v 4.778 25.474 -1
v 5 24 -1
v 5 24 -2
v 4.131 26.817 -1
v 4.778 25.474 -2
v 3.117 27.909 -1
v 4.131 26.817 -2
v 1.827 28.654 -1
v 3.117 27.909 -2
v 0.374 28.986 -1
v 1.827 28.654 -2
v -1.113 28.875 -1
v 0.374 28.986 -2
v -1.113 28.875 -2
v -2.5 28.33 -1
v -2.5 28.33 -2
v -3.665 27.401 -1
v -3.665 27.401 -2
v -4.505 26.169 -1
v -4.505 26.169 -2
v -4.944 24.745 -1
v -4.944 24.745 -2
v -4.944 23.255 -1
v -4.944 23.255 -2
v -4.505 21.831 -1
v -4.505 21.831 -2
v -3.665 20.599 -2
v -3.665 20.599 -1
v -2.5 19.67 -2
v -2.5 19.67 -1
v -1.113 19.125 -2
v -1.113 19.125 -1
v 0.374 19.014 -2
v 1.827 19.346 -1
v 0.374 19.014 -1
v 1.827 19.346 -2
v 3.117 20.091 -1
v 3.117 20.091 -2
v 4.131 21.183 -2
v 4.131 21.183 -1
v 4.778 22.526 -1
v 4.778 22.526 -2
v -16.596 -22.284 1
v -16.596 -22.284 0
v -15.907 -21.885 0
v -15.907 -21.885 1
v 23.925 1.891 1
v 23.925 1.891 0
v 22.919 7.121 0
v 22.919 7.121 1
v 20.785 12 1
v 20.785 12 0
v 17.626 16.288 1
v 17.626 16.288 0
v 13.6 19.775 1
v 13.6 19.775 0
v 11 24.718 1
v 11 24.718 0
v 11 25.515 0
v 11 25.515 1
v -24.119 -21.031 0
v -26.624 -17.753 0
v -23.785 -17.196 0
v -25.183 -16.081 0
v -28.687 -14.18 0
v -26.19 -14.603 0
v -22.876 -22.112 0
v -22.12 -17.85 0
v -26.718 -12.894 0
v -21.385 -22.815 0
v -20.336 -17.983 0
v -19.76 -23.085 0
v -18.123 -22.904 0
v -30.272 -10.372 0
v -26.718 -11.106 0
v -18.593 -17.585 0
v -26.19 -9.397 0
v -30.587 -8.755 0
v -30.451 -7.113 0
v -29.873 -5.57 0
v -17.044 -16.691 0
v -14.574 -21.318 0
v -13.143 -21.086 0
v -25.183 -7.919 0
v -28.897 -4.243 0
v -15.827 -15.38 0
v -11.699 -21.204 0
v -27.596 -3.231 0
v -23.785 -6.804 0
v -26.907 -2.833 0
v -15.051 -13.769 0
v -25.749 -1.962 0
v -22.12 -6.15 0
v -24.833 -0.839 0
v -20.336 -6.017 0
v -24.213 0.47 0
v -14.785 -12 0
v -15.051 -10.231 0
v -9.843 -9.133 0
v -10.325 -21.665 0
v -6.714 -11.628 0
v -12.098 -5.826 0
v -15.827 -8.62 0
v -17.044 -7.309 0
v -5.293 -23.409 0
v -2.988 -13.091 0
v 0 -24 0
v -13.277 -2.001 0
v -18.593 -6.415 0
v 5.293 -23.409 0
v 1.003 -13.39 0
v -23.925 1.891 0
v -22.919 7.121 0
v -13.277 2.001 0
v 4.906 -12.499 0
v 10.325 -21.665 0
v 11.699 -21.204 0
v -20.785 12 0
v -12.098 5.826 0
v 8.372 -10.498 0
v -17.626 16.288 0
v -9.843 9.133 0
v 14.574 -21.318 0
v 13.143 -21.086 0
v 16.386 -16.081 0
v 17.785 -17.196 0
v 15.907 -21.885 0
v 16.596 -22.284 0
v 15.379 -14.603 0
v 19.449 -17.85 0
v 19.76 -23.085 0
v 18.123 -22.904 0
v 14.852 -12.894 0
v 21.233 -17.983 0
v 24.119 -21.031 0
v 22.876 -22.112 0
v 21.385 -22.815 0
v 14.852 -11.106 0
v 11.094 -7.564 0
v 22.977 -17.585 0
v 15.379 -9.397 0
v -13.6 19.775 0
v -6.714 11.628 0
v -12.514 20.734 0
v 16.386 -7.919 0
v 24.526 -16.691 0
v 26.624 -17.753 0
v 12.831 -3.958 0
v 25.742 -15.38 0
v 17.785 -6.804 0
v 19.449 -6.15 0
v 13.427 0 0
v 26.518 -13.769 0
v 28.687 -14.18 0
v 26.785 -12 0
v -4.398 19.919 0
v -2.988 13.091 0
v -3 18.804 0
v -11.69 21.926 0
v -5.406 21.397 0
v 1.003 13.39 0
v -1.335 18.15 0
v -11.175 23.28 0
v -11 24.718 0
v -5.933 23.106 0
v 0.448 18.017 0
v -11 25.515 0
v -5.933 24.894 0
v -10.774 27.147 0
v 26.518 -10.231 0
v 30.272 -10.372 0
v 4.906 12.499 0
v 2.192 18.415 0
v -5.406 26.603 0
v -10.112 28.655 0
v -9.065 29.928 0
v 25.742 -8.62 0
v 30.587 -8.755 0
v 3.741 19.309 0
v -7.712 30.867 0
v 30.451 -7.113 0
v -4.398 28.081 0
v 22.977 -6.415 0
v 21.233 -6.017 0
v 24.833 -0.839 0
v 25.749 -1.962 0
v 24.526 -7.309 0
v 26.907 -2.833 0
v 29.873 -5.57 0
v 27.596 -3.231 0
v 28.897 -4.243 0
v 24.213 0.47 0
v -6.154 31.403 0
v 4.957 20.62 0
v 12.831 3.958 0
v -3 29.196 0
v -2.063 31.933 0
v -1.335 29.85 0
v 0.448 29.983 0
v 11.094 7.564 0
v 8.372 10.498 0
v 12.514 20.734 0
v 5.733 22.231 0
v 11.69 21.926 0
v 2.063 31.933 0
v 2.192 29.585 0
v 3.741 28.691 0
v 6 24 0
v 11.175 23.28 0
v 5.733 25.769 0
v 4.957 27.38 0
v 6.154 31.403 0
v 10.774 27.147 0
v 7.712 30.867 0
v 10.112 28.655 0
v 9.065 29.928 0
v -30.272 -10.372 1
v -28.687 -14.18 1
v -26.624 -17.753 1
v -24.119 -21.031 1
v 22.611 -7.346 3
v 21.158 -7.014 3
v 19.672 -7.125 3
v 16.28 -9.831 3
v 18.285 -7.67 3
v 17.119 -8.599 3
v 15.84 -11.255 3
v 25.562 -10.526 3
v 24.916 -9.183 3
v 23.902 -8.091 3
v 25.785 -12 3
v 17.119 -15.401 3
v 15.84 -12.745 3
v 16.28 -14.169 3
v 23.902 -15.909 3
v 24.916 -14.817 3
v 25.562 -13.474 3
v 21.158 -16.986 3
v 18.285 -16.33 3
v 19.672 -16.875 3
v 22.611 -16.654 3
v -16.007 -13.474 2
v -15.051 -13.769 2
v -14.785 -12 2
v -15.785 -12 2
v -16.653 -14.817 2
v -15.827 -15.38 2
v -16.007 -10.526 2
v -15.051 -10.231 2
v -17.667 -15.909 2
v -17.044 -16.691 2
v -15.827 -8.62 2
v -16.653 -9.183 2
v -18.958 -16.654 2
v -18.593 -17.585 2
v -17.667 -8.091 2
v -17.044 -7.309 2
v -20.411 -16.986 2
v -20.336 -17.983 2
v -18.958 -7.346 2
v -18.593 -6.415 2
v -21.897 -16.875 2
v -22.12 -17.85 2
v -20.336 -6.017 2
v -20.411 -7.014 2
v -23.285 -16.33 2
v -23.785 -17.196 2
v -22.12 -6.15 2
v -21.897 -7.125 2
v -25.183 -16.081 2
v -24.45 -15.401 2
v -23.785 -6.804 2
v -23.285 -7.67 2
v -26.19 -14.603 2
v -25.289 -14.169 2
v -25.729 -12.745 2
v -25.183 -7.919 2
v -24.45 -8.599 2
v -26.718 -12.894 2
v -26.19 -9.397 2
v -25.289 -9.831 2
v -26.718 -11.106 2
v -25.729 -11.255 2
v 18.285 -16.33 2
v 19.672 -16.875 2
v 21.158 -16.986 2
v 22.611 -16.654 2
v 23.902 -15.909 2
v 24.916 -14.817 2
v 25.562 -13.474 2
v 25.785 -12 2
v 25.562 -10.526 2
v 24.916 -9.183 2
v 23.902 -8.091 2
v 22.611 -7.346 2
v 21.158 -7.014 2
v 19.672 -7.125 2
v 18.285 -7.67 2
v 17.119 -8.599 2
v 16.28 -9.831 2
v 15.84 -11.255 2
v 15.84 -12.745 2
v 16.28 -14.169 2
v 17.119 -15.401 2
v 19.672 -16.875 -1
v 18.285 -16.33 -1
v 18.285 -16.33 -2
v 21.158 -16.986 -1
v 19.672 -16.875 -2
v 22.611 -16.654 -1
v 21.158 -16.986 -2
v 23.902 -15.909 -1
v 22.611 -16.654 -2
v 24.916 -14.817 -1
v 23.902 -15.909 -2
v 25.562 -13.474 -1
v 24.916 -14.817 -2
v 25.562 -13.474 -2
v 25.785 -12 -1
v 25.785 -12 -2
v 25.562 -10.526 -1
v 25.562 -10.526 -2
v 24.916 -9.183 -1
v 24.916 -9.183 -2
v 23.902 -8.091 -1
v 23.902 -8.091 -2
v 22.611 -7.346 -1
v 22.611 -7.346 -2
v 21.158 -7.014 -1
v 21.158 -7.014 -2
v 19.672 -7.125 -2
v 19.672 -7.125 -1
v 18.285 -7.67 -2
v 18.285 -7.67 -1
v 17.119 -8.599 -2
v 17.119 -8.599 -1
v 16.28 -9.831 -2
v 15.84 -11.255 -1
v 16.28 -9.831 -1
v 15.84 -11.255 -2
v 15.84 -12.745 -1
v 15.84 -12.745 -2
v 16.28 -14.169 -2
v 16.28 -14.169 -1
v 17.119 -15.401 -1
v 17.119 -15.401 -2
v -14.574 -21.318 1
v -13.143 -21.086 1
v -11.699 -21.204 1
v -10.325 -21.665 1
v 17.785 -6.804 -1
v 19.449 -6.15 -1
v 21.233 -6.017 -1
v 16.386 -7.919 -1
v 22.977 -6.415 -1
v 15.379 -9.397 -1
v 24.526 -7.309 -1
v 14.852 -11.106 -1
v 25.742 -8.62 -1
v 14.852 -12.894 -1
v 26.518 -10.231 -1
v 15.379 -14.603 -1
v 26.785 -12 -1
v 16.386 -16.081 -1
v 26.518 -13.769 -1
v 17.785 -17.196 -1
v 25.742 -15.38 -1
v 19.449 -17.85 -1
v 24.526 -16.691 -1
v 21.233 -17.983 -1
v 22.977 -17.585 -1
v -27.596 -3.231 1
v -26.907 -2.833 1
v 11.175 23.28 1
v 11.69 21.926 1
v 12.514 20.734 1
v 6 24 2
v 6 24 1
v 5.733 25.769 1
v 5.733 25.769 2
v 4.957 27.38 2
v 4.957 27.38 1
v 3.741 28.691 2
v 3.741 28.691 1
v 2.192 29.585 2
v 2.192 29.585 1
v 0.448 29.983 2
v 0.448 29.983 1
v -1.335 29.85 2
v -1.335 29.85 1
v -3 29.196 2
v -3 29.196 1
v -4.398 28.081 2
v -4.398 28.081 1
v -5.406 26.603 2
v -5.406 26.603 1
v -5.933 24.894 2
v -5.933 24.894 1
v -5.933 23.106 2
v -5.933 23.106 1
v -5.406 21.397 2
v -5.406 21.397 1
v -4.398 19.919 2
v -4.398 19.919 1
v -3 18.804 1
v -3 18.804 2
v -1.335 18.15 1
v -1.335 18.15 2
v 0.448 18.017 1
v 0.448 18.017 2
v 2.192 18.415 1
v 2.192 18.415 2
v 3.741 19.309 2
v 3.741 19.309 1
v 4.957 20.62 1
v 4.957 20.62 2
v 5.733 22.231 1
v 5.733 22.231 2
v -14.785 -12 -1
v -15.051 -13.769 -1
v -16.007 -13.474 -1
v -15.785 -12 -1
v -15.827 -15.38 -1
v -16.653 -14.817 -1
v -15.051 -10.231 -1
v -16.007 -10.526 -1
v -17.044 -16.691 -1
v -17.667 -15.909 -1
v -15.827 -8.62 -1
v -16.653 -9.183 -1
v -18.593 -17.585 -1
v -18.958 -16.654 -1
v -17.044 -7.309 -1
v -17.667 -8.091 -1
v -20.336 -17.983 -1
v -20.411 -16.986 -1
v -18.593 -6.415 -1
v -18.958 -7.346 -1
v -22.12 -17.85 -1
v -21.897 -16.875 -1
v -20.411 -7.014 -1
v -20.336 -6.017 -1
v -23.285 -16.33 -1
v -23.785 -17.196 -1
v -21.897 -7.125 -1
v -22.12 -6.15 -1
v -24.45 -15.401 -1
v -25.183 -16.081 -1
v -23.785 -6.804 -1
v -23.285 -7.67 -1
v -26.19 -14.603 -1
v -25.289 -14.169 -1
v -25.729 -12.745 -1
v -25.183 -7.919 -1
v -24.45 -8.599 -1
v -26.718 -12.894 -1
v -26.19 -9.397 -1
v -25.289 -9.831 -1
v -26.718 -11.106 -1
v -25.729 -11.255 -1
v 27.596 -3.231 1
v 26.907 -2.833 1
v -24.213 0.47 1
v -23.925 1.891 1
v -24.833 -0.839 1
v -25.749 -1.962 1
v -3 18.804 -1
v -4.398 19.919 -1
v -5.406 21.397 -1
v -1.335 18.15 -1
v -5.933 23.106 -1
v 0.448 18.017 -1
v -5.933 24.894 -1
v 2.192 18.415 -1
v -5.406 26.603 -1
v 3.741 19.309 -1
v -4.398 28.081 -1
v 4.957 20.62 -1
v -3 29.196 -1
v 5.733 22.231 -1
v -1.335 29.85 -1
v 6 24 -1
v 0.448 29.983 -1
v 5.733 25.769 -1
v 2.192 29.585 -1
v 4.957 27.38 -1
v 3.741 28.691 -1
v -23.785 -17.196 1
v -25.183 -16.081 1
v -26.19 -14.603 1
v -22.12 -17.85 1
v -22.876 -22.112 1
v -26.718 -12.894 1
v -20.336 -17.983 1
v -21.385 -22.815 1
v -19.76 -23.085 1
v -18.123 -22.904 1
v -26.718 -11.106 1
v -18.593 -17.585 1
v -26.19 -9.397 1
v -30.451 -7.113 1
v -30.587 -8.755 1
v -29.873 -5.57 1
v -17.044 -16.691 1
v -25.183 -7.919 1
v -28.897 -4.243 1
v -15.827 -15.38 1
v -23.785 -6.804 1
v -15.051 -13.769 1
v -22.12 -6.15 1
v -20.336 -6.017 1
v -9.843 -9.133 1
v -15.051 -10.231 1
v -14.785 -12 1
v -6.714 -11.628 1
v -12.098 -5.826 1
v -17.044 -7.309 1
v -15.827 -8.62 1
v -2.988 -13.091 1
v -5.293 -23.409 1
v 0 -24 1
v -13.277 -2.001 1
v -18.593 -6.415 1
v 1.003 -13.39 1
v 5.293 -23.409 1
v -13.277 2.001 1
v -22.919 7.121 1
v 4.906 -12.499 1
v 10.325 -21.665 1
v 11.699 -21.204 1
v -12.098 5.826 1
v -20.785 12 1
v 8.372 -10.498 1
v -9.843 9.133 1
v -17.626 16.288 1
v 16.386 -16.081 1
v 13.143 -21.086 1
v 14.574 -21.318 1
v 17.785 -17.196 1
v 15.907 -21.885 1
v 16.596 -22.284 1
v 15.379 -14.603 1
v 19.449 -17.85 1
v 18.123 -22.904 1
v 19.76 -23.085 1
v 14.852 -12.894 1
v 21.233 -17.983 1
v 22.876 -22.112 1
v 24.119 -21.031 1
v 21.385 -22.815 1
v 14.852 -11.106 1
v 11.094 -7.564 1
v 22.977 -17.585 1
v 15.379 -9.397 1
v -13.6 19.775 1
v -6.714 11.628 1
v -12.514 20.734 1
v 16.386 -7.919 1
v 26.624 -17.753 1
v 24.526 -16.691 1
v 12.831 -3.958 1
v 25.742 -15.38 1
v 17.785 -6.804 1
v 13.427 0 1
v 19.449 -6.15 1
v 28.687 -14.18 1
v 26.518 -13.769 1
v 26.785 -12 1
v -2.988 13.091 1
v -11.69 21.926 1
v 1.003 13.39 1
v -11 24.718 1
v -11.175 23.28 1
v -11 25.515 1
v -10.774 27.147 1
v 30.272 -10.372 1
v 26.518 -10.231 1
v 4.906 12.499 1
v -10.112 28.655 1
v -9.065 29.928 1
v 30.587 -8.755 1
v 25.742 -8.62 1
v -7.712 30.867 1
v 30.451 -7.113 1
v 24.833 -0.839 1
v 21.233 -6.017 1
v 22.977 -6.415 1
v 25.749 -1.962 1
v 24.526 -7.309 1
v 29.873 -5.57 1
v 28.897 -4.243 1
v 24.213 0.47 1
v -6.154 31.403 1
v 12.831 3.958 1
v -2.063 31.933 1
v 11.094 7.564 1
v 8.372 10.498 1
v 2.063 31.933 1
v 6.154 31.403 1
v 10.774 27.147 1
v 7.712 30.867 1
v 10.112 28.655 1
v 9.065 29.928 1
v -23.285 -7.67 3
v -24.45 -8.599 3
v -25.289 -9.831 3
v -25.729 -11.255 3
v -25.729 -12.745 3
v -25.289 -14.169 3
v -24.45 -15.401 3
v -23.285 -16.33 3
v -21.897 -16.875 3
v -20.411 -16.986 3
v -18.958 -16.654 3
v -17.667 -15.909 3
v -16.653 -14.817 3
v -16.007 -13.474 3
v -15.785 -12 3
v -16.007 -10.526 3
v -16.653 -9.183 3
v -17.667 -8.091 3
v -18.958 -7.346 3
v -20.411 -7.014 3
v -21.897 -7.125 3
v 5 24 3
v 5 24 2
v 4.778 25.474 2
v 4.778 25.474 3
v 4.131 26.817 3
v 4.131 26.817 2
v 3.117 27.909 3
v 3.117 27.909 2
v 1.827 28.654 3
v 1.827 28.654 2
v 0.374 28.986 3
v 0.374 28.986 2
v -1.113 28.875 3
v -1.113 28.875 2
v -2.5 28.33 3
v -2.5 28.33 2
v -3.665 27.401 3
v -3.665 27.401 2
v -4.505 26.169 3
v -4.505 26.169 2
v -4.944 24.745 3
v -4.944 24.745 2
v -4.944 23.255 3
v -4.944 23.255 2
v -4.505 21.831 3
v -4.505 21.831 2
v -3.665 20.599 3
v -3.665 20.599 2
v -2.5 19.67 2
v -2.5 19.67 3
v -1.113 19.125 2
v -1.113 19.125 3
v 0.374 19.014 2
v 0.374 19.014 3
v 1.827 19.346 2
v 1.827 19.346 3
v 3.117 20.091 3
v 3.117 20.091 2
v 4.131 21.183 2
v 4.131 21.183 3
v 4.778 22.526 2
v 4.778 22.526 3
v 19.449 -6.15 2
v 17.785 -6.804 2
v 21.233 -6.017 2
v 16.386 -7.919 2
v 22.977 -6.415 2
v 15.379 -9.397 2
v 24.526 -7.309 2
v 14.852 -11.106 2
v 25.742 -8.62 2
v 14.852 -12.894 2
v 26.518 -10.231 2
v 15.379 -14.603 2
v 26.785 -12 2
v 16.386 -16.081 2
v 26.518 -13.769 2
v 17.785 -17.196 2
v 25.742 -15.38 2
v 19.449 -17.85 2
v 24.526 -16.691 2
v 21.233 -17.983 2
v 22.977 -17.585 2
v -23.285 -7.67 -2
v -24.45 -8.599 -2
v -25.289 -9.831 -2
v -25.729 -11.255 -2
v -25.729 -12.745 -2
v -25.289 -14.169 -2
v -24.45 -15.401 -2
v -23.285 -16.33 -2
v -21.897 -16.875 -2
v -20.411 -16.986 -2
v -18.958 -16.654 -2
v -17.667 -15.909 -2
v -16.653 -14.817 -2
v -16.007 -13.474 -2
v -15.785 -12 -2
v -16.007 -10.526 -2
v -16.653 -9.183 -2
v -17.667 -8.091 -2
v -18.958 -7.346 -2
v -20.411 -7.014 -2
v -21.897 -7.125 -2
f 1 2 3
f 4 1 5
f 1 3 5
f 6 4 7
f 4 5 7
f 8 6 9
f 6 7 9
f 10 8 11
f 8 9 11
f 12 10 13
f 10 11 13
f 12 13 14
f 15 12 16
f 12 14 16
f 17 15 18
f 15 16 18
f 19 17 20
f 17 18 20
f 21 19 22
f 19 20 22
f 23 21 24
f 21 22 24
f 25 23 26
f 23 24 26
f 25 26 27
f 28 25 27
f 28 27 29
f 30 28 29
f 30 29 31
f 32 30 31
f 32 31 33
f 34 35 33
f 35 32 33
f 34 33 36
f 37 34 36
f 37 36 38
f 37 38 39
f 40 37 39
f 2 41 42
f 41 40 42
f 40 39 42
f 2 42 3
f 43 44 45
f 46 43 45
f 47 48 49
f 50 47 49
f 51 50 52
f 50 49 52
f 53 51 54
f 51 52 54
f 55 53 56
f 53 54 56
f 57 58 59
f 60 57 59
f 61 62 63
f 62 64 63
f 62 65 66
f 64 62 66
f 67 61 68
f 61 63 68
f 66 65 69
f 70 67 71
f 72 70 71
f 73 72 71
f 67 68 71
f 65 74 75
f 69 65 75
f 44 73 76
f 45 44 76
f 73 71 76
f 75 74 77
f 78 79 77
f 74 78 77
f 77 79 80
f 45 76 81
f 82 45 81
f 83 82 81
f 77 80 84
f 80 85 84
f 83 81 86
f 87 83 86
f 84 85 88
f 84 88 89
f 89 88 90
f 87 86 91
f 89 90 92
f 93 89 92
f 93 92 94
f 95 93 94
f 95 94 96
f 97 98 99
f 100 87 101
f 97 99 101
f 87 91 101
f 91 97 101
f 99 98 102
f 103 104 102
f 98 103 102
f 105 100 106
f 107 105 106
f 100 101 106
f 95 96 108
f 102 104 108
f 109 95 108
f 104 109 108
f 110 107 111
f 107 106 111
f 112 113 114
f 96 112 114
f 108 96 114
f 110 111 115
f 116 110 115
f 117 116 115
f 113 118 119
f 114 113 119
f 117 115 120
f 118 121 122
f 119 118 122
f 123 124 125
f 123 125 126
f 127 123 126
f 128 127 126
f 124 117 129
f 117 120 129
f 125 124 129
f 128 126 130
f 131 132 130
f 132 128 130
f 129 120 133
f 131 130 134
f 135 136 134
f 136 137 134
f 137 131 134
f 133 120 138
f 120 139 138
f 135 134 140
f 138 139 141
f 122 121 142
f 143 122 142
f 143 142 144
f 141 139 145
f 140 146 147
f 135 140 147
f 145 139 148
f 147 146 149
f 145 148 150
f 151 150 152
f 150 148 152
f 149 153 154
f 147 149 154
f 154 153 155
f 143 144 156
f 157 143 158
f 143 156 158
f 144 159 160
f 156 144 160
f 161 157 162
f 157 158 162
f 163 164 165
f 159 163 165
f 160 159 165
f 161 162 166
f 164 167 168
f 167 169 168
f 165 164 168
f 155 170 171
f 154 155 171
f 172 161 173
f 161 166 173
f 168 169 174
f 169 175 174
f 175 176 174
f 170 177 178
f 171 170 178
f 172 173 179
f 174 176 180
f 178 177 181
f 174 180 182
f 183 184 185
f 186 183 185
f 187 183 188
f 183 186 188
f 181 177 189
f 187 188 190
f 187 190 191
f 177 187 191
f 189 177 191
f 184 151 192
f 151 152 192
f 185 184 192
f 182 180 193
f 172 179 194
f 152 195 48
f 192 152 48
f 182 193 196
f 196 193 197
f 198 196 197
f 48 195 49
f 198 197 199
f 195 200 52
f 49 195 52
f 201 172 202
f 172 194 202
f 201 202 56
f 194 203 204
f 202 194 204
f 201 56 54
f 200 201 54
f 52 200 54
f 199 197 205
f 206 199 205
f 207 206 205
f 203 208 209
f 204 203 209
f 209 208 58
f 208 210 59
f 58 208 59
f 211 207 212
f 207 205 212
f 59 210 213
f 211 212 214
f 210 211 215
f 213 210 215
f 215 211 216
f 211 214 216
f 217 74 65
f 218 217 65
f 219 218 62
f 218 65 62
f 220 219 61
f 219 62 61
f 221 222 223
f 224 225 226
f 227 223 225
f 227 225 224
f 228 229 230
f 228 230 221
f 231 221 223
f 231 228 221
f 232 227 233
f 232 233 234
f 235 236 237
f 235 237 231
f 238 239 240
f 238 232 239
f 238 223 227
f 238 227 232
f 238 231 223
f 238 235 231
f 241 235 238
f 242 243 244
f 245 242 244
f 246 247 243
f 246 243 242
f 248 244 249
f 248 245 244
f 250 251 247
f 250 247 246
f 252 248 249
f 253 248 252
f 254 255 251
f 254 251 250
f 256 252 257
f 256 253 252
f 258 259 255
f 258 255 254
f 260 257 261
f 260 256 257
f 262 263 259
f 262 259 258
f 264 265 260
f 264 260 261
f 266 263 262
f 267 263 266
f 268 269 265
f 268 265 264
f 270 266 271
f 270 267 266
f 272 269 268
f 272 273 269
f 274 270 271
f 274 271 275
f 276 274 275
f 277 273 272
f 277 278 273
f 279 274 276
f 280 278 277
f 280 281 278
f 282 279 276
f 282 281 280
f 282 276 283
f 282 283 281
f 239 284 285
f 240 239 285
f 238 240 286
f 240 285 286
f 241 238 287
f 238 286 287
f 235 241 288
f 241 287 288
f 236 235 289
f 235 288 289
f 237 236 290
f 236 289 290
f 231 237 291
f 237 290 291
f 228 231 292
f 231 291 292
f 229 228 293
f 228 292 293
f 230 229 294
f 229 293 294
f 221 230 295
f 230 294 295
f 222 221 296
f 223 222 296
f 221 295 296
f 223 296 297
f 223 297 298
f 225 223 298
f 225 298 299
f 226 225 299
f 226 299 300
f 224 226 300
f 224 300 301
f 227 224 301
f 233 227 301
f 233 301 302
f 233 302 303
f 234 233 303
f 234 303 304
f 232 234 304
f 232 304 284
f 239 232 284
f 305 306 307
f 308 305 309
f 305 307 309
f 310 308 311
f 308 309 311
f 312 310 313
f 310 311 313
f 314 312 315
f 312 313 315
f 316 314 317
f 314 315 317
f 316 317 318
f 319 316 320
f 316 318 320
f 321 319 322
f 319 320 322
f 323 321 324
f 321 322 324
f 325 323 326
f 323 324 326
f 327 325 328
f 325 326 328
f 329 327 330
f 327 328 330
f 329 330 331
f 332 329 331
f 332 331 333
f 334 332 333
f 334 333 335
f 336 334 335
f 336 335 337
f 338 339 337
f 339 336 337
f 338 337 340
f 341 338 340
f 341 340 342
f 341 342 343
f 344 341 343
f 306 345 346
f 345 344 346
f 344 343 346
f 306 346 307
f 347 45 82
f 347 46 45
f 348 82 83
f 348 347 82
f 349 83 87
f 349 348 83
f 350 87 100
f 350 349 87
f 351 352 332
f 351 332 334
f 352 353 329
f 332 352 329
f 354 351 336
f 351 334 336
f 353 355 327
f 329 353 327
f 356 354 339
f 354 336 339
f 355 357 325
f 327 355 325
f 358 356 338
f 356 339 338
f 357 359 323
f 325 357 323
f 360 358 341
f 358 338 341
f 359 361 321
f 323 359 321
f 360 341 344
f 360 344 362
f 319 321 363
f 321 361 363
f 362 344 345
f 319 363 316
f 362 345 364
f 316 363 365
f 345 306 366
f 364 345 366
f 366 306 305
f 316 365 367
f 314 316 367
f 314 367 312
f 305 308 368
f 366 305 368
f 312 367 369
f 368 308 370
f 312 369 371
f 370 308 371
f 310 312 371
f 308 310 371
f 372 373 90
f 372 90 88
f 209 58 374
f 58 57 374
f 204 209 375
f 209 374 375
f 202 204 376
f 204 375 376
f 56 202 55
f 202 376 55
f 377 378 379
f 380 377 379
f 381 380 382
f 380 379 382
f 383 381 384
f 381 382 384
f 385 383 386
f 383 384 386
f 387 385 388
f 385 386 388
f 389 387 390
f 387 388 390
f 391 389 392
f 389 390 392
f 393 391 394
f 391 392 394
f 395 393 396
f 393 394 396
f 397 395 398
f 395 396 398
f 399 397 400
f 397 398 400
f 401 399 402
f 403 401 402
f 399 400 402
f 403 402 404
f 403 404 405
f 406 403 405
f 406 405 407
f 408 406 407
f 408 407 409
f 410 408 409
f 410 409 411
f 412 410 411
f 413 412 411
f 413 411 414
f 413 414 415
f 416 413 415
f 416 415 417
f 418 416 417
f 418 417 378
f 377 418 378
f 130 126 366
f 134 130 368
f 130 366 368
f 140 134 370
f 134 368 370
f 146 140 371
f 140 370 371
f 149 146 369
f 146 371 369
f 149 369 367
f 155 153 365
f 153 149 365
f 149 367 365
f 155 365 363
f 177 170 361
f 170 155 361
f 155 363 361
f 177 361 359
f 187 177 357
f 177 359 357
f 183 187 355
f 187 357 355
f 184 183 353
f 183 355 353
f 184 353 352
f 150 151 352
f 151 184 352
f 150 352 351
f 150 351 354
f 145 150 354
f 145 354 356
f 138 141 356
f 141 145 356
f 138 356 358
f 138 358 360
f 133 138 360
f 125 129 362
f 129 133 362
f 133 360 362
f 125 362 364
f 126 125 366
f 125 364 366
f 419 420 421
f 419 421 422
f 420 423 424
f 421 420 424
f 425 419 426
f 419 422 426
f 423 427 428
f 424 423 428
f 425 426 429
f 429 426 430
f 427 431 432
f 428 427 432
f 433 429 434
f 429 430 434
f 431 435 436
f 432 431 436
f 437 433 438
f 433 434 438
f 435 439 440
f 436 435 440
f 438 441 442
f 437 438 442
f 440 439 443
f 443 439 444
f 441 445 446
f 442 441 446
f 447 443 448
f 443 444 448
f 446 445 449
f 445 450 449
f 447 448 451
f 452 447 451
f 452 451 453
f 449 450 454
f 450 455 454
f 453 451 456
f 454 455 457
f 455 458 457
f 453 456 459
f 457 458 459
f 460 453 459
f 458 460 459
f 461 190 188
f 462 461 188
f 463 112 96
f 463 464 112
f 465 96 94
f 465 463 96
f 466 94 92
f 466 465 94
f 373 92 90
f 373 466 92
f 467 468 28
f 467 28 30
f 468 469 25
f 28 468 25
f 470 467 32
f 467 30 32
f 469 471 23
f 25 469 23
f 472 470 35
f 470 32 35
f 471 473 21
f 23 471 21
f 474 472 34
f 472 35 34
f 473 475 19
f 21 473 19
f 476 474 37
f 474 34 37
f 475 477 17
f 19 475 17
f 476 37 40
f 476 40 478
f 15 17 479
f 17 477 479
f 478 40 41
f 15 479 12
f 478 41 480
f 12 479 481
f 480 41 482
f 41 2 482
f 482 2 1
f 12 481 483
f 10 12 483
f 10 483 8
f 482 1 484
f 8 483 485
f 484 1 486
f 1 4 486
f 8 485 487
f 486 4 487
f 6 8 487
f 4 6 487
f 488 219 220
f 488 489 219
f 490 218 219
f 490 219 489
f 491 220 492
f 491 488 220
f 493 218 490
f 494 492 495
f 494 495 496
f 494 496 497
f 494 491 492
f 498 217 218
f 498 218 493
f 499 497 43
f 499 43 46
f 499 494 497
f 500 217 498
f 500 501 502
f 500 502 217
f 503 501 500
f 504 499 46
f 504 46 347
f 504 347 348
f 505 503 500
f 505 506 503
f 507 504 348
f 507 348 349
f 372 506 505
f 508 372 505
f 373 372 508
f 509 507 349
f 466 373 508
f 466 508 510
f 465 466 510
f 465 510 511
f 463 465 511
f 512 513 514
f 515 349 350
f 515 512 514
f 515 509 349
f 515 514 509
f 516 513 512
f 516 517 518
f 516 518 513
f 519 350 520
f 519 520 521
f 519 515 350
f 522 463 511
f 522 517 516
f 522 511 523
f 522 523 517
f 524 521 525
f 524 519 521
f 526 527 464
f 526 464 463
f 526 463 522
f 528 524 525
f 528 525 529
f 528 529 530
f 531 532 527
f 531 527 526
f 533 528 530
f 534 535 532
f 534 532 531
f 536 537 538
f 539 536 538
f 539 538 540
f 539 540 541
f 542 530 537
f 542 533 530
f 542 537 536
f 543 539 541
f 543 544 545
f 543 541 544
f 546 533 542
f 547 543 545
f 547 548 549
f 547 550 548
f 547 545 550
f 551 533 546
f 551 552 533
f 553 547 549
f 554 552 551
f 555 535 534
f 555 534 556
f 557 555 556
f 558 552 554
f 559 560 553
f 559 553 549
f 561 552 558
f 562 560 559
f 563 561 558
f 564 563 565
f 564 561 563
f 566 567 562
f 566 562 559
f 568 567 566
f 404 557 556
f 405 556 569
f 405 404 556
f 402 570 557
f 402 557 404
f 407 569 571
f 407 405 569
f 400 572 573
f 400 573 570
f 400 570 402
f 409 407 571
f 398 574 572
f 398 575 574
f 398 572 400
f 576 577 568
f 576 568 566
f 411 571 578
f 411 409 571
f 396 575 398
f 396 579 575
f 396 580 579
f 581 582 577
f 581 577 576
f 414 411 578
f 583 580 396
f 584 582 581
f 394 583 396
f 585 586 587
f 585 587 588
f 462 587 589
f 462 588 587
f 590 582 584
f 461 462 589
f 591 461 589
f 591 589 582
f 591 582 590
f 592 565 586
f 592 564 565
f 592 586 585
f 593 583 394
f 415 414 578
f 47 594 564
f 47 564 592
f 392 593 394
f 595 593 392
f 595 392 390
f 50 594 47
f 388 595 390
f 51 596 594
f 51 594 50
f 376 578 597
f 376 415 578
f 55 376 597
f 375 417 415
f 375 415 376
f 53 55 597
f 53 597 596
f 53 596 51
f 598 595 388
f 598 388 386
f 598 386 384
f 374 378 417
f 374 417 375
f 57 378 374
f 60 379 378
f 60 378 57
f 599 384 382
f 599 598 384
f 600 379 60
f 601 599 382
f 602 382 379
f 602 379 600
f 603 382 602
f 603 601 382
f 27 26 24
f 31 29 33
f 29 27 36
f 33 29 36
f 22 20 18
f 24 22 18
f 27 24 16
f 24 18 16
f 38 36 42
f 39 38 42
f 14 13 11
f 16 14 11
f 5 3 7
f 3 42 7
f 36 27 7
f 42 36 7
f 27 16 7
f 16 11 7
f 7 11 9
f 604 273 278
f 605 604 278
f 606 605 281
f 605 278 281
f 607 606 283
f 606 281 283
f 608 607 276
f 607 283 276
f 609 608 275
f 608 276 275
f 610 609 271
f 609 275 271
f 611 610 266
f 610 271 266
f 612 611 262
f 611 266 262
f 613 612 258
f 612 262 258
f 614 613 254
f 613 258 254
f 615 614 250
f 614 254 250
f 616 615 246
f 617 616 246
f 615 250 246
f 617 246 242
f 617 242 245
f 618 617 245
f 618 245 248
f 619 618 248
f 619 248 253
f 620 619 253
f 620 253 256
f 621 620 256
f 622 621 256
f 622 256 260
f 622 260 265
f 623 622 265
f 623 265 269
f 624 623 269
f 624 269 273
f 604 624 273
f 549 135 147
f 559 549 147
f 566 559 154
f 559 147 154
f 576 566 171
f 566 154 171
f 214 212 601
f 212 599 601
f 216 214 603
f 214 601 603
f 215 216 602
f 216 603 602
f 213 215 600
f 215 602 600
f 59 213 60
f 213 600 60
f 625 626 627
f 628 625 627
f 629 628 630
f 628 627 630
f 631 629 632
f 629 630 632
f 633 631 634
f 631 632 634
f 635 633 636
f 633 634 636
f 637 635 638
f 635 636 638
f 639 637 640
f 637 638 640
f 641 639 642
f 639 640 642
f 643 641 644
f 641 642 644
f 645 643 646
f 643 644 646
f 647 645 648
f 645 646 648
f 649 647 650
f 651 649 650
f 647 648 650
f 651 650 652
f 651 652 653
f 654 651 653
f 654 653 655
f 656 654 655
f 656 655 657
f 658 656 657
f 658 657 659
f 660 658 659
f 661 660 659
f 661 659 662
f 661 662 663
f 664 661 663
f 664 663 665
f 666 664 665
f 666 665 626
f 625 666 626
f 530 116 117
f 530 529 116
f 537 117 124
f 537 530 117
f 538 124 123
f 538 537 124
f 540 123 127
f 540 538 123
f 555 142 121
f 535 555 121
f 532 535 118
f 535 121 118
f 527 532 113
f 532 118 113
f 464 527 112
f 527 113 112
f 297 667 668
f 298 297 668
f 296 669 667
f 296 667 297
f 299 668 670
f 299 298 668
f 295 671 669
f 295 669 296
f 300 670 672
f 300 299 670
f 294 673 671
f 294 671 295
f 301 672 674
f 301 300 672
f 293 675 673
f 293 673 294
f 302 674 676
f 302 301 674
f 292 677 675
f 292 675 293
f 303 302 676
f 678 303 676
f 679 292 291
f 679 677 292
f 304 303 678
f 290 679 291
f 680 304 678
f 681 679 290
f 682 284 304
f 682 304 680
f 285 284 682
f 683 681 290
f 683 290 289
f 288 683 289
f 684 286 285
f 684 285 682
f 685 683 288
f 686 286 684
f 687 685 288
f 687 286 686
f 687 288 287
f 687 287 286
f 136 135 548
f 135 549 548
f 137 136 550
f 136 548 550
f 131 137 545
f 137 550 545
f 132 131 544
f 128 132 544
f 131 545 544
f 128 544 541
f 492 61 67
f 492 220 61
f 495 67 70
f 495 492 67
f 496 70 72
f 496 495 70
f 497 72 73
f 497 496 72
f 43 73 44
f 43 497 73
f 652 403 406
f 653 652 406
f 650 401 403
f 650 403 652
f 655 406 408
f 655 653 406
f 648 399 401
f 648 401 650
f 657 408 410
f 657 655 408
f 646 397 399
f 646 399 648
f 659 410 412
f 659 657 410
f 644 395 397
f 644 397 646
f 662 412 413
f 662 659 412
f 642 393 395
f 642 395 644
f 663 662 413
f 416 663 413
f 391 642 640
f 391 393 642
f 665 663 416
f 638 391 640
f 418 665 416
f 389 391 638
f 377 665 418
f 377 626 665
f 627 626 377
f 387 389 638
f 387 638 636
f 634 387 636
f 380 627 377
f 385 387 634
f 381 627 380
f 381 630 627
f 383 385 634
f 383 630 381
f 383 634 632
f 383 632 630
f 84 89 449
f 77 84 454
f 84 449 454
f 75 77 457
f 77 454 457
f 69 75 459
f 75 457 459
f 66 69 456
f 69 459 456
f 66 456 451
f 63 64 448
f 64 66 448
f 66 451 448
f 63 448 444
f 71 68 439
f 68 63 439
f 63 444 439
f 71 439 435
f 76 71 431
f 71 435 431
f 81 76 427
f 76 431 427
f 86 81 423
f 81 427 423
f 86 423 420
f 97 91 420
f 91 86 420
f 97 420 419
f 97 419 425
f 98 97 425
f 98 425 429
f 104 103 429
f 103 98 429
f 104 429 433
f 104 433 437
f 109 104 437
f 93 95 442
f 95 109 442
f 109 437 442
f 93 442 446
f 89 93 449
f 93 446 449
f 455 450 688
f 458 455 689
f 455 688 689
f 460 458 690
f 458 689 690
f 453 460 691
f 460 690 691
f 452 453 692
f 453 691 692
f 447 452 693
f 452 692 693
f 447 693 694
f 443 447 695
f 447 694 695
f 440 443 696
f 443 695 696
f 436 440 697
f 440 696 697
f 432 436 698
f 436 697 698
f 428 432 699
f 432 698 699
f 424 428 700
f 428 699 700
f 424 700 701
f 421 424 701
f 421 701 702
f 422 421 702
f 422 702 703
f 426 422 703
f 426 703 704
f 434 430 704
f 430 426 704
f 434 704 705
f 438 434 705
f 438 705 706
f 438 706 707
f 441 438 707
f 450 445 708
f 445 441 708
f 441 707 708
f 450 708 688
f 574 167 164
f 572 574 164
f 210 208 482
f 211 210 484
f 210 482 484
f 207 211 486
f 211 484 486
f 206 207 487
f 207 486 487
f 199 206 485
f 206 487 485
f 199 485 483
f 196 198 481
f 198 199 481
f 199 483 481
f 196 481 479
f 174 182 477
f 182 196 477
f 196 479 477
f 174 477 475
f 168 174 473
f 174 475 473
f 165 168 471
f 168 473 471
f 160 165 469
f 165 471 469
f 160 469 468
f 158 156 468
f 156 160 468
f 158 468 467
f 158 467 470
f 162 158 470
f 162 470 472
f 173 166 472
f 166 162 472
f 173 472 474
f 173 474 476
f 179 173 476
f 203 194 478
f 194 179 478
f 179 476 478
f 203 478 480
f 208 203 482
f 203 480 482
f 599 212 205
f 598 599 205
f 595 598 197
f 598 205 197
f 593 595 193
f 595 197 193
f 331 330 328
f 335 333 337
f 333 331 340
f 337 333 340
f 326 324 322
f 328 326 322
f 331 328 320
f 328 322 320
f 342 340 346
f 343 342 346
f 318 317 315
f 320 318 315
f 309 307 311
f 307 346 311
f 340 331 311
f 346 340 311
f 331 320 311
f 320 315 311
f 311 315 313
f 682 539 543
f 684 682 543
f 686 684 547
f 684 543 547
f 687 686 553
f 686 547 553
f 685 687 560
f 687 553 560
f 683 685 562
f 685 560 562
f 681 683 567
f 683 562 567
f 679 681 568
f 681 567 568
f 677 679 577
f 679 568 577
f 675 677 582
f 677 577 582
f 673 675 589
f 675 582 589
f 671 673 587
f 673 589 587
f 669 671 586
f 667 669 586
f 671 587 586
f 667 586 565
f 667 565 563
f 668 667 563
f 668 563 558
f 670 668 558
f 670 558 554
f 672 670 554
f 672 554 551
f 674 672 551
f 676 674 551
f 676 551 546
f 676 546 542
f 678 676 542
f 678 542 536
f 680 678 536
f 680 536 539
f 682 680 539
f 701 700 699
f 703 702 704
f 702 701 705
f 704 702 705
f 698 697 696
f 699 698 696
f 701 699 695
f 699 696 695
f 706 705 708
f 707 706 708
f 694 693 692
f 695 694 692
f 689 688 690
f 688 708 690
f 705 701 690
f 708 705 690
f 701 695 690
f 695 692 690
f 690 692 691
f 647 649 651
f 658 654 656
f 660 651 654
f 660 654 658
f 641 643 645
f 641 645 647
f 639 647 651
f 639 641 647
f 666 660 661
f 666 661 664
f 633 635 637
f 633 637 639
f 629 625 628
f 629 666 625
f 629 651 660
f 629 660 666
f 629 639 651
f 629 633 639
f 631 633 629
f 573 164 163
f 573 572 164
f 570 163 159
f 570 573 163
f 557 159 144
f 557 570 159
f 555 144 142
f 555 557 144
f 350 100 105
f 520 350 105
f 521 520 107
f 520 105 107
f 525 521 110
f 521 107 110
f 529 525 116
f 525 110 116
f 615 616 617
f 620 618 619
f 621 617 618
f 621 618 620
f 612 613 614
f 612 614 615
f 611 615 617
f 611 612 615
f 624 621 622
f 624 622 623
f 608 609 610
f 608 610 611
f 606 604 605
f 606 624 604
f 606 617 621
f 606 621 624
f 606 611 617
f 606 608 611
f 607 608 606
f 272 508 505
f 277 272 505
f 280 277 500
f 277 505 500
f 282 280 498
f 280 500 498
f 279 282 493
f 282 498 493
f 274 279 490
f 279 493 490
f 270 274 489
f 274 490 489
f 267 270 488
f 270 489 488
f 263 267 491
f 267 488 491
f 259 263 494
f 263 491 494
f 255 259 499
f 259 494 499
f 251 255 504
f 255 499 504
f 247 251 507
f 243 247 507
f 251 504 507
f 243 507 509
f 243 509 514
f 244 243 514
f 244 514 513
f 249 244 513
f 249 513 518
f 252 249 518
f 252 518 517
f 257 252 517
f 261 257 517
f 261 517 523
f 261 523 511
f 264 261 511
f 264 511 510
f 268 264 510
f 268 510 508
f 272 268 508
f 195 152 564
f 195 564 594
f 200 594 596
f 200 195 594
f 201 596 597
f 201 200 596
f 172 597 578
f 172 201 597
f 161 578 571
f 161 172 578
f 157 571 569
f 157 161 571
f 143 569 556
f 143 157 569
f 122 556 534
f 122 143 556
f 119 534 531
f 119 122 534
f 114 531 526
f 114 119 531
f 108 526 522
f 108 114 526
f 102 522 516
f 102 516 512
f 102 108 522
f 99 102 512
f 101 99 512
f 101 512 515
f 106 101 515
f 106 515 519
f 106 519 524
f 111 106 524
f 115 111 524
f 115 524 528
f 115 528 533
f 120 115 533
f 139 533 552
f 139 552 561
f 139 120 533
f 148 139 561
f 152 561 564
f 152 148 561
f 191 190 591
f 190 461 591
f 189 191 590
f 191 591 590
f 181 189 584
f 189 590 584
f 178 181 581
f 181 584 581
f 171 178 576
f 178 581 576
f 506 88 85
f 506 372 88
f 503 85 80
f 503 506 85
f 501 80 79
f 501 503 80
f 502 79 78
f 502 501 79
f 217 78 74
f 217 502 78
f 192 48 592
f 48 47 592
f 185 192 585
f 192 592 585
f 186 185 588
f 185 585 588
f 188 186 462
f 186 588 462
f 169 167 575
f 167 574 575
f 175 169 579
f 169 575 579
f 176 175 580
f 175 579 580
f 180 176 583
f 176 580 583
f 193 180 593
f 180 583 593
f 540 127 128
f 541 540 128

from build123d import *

# Parameters (mm, degrees)
SKETCH9_R           = 13.427276503
SKETCH9_R_2         = 5
BOSS_EXTRUDE1_DEPTH = 1
FILLET1_R           = 6
BOSS_EXTRUDE2_START = -3
SKETCH14_R          = 5
BOSS_EXTRUDE2_DEPTH = 5
BOSS_EXTRUDE3_START = -2
SKETCH15_R          = 6
BOSS_EXTRUDE3_DEPTH = 3
CIRPATTERN1_COUNT   = 3


with BuildPart() as part:
    # Sketch9 → Boss-Extrude1 (new body)
    with BuildSketch(Plane.XY):
        with BuildLine():
            Line((-11, 30.049958403), (-11, 21.330729008))
            ThreePointArc((-11, 21.330729008), (-20.784609691, 12), (-23.972953202, -1.139085062))
            Line((-23.972953202, -1.139085062), (-31.524027359, -5.49869976))
            ThreePointArc((-31.524027359, -5.49869976), (-27.712812921, -16), (-20.524027359, -24.551258643))
            Line((-20.524027359, -24.551258643), (-12.972953202, -20.191643945))
            ThreePointArc((-12.972953202, -20.191643945), (0, -24), (12.972953202, -20.191643945))
            Line((12.972953202, -20.191643945), (20.524027359, -24.551258643))
            ThreePointArc((20.524027359, -24.551258643), (27.712812921, -16), (31.524027359, -5.49869976))
            Line((31.524027359, -5.49869976), (23.972953202, -1.139085062))
            ThreePointArc((23.972953202, -1.139085062), (20.784609691, 12), (11, 21.330729008))
            Line((11, 21.330729008), (11, 30.049958403))
            ThreePointArc((11, 30.049958403), (0, 32), (-11, 30.049958403))
        make_face()
        Circle(SKETCH9_R, mode=Mode.SUBTRACT)
        with Locations((0, 24)):
            Circle(SKETCH9_R_2, mode=Mode.SUBTRACT)
        with Locations((20.784609691, -12)):
            Circle(SKETCH9_R_2, mode=Mode.SUBTRACT)
        with Locations((-20.784609691, -12)):
            Circle(SKETCH9_R_2, mode=Mode.SUBTRACT)
    extrude(amount=BOSS_EXTRUDE1_DEPTH)

    # Fillet1
    fillet1_edges = [part.edges().sort_by_distance(p)[0] for p in [
        (11, 30.049958403, 0.5),
        (11, 21.330729008, 0.5),
        (23.972953202, -1.139085062, 0.5),
        (31.524027359, -5.49869976, 0.5),
        (20.524027359, -24.551258643, 0.5),
        (12.972953202, -20.191643945, 0.5),
        (-12.972953202, -20.191643945, 0.5),
        (-20.524027359, -24.551258643, 0.5),
        (-31.524027359, -5.49869976, 0.5),
        (-23.972953202, -1.139085062, 0.5),
        (-11, 21.330729008, 0.5),
        (-11, 30.049958403, 0.5),
    ]]
    fillet(fillet1_edges, radius=FILLET1_R)

    # Sketch14 → Boss-Extrude2 (add)
    with BuildSketch(Plane.XY.offset(1).offset(BOSS_EXTRUDE2_START)):
        with Locations((0, 24)):
            Circle(SKETCH14_R)
    boss_extrude2 = extrude(amount=BOSS_EXTRUDE2_DEPTH)

    # Sketch15 → Boss-Extrude3 (add)
    with BuildSketch(Plane.XY.offset(1).offset(BOSS_EXTRUDE3_START)):
        with Locations((0, 24)):
            Circle(SKETCH15_R)
    boss_extrude3 = extrude(amount=BOSS_EXTRUDE3_DEPTH)

    # CirPattern1: Boss-Extrude2, Boss-Extrude3 ×3 about axis
    cirpattern1_axis = Axis((0, 0, 0), (0, 0, 1))
    add([boss_extrude2.rotate(cirpattern1_axis, i * 360 / CIRPATTERN1_COUNT) for i in range(1, CIRPATTERN1_COUNT)])
    add([boss_extrude3.rotate(cirpattern1_axis, i * 360 / CIRPATTERN1_COUNT) for i in range(1, CIRPATTERN1_COUNT)])


solid = part.part
